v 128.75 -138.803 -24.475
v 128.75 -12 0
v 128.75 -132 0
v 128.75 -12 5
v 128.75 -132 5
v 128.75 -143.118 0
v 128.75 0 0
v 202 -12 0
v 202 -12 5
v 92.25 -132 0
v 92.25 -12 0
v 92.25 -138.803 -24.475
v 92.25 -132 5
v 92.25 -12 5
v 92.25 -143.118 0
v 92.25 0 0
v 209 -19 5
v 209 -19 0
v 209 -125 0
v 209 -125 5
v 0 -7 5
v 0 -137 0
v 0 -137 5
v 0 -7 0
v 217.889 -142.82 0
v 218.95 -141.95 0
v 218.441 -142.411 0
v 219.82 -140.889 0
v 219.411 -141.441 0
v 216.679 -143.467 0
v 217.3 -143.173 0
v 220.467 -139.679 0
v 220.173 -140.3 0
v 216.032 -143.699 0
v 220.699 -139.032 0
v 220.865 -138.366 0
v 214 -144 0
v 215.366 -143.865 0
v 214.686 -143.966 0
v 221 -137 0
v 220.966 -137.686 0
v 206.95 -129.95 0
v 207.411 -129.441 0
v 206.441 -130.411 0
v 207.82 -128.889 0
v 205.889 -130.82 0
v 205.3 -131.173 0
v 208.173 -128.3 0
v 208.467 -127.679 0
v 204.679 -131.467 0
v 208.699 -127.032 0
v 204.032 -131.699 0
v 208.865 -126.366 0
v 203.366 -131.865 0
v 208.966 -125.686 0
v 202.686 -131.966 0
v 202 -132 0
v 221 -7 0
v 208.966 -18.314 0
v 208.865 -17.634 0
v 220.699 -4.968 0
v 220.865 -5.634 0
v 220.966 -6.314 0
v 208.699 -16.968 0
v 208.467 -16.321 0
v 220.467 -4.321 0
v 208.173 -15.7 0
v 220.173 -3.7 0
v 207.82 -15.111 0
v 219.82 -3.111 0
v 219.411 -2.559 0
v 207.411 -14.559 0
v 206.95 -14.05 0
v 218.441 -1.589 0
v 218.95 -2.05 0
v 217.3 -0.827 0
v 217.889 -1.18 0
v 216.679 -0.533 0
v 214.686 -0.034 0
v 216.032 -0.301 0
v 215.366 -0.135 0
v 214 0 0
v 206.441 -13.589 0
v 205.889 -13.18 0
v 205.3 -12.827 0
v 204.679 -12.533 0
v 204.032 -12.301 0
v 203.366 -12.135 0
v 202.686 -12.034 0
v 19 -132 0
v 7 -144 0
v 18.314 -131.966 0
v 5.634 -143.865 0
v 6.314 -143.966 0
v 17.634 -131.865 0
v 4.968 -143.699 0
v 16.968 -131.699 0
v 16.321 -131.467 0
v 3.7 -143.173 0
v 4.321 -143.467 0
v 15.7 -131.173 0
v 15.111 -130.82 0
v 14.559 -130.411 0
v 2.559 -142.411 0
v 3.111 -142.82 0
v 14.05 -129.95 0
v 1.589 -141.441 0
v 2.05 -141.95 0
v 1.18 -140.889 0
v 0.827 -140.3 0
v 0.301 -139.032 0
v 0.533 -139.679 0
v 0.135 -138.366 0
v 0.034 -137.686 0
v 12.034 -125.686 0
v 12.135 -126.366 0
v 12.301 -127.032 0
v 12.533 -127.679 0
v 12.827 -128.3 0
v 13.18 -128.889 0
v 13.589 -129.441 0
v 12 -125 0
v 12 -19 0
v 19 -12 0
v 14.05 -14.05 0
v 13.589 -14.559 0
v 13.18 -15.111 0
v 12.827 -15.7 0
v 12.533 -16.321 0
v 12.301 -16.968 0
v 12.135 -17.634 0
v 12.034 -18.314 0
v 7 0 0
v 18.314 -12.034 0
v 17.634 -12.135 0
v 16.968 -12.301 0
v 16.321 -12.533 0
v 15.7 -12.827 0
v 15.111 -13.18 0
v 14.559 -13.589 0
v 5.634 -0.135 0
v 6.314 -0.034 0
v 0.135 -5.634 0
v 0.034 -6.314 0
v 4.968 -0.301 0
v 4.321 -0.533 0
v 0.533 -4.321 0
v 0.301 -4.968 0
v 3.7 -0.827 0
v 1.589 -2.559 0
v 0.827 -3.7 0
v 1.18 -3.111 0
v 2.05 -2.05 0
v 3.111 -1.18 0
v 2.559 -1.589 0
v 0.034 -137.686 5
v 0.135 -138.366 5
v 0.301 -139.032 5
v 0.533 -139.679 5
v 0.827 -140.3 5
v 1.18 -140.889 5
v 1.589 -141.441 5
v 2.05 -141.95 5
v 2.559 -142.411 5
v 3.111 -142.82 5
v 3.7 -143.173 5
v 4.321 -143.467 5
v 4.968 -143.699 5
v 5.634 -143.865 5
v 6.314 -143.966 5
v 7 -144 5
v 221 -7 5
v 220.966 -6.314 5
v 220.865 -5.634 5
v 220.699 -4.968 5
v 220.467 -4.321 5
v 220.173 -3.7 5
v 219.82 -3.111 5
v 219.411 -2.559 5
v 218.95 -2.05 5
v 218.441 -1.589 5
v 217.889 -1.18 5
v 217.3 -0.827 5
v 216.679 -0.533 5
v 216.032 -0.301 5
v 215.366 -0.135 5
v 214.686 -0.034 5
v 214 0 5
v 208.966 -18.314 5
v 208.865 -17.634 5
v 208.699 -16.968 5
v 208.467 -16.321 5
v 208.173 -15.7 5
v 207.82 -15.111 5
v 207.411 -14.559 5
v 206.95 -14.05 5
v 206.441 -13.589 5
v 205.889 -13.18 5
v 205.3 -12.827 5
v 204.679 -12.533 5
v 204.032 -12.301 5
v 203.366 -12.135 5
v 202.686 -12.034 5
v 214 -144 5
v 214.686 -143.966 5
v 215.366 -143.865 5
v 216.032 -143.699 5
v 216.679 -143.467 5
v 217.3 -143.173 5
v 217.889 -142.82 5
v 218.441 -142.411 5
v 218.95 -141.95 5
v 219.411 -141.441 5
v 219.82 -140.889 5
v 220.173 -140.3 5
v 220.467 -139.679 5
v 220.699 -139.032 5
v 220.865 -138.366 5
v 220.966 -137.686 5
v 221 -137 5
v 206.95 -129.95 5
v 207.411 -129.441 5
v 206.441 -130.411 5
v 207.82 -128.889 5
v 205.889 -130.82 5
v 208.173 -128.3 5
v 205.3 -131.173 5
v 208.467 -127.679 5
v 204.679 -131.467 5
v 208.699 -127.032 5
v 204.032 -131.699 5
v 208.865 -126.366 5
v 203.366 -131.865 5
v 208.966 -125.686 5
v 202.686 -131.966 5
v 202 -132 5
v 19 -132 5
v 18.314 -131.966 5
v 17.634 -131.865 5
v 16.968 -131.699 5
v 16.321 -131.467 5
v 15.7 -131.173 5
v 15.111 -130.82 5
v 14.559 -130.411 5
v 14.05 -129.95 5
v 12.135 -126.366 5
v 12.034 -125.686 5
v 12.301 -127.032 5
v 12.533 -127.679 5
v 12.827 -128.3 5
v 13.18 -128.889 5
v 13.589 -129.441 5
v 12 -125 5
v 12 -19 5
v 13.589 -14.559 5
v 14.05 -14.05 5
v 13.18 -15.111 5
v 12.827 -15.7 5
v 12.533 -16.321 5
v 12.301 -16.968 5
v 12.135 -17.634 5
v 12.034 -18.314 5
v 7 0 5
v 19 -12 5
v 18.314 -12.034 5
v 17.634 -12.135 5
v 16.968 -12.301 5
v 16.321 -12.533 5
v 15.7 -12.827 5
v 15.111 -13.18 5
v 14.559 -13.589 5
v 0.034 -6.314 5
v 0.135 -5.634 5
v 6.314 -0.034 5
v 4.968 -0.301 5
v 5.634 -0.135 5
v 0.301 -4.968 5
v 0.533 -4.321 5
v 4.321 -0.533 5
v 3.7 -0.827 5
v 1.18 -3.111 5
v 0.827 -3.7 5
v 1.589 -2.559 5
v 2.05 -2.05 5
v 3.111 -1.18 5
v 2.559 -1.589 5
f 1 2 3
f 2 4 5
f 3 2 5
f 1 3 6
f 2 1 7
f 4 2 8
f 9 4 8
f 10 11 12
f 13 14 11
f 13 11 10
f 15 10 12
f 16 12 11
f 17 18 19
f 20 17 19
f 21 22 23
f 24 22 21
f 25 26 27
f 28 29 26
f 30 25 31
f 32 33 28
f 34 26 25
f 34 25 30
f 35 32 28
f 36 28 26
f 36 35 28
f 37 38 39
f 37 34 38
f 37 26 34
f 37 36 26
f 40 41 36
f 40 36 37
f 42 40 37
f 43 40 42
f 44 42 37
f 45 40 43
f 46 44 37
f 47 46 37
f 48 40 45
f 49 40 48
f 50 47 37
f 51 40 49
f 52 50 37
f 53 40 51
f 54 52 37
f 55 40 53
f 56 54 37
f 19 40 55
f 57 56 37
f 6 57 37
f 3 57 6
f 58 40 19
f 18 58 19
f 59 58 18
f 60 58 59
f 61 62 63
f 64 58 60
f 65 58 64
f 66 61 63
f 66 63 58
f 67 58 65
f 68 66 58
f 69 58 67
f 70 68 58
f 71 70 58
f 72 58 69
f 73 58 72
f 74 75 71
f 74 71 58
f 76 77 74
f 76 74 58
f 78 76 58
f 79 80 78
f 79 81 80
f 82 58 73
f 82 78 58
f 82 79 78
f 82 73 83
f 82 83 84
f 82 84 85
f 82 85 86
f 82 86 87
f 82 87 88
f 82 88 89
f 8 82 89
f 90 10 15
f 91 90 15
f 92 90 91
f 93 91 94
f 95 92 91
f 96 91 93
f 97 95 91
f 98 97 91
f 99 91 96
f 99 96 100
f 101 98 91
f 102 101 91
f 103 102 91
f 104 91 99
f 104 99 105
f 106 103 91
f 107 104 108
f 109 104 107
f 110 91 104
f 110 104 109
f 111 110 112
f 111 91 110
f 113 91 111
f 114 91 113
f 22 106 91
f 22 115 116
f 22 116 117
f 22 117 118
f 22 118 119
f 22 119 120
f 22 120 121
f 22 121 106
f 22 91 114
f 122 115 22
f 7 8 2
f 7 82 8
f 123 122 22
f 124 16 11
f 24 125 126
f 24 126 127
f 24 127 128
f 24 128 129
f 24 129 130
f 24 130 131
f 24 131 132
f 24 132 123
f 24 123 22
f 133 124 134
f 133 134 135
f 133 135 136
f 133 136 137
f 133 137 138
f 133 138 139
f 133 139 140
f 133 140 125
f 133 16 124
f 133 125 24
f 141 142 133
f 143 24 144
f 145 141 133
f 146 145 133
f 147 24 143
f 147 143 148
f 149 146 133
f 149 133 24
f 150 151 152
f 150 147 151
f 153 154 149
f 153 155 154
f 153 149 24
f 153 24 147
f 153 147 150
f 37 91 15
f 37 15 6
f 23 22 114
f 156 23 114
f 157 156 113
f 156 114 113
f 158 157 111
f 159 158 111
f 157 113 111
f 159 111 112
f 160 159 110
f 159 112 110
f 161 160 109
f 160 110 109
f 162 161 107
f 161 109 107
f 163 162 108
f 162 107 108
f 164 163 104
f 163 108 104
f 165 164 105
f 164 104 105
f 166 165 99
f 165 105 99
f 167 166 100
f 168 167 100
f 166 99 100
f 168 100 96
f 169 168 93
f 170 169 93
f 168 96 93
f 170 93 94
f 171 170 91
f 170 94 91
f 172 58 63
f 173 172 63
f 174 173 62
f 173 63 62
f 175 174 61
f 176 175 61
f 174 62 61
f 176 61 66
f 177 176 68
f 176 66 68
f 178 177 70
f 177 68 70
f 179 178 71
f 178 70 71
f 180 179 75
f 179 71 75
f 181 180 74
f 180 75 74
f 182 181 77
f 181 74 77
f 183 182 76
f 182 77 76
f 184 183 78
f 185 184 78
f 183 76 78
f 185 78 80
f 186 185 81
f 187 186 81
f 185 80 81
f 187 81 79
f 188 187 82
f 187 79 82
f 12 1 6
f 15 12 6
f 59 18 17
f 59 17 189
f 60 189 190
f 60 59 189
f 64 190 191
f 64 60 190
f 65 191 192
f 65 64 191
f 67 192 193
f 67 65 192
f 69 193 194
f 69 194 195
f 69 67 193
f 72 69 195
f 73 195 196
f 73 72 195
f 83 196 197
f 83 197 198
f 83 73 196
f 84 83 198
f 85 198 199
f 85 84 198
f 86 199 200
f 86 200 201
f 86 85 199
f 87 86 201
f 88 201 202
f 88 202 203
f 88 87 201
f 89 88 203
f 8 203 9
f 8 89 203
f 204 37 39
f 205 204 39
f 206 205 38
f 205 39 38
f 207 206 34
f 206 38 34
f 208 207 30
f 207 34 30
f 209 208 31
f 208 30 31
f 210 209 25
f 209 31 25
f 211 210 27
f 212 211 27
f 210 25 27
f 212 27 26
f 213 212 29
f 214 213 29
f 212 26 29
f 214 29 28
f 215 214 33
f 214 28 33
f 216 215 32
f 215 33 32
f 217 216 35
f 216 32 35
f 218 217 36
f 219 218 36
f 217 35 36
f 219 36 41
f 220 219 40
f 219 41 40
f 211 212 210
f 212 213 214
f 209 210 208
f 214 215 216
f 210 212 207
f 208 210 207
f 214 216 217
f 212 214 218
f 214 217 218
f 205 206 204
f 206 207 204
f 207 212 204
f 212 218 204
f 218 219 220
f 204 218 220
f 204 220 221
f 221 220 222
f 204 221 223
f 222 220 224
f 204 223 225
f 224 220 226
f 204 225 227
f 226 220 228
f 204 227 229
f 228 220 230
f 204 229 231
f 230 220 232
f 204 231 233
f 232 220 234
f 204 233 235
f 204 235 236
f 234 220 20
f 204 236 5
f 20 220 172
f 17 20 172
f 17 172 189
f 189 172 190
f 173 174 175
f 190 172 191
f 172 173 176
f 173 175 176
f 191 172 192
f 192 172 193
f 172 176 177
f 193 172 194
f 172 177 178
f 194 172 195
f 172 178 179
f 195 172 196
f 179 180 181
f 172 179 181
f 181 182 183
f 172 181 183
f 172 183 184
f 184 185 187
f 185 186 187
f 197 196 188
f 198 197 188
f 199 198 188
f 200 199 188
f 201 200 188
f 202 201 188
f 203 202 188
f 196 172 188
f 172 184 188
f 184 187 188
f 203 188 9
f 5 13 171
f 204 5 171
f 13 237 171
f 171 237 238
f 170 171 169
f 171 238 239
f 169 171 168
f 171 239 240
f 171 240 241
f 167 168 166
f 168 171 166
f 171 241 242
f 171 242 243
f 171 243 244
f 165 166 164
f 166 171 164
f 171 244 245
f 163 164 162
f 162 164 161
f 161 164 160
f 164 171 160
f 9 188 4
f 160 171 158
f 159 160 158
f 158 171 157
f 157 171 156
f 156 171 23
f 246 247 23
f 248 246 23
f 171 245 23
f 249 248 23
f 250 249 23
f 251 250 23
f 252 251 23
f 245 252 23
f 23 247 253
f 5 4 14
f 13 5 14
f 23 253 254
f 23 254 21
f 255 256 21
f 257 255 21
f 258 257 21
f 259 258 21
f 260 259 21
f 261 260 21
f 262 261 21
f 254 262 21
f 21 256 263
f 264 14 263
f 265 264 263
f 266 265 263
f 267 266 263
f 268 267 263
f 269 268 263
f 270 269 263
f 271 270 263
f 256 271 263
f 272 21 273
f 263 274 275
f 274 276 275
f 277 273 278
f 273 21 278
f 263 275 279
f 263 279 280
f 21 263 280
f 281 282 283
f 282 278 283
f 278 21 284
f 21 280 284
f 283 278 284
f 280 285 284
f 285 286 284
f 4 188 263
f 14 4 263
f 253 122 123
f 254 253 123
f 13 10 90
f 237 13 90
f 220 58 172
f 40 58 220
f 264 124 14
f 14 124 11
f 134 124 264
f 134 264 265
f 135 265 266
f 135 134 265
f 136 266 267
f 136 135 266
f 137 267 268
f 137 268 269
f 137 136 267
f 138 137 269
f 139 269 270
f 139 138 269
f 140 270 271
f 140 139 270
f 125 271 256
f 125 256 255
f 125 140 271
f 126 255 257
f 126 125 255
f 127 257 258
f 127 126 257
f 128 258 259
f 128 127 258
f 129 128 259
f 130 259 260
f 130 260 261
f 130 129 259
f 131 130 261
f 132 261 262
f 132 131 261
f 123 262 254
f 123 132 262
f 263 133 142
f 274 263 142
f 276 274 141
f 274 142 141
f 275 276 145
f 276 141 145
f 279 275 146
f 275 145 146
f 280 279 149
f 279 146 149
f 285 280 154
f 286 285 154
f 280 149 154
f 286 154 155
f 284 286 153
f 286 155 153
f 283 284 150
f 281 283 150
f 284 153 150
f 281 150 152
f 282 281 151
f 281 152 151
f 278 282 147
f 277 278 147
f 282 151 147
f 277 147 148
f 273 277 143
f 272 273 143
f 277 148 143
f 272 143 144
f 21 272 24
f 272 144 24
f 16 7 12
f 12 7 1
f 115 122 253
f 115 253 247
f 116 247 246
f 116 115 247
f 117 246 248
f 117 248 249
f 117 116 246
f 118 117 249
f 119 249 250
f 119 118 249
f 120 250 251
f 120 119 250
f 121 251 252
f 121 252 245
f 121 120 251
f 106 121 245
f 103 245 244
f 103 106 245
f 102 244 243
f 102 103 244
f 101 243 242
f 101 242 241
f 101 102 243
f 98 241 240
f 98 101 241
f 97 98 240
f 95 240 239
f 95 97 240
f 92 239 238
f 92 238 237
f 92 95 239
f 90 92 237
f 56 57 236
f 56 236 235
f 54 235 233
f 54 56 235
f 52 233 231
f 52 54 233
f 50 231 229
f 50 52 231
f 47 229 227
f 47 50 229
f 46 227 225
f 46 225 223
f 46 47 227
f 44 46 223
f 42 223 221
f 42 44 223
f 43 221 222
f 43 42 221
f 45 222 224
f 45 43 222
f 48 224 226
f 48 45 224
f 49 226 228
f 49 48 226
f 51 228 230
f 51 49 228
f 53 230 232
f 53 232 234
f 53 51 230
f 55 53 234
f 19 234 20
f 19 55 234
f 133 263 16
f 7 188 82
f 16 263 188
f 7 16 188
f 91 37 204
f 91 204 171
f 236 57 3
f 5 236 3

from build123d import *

# Parameters (mm, degrees)
PAD_DEPTH    = 5
PAD001_DEPTH = 18.25


with BuildPart() as part:
    # Sketch → Pad (new body)
    with BuildSketch(Plane.XY):
        with BuildLine():
            Line((7, 0), (214, 0))
            ThreePointArc((221, -7), (218.949747, -2.050253), (214, 0))
            Line((221, -7), (221, -137))
            ThreePointArc((214, -144), (218.949747, -141.949747), (221, -137))
            Line((214, -144), (7, -144))
            ThreePointArc((0, -137), (2.050253, -141.949747), (7, -144))
            Line((0, -137), (0, -7))
            ThreePointArc((7, 0), (2.050253, -2.050253), (0, -7))
        make_face()
        with BuildLine():
            Line((19, -12), (202, -12))
            ThreePointArc((209, -19), (206.949747, -14.050253), (202, -12))
            Line((209, -19), (209, -125))
            ThreePointArc((202, -132), (206.949747, -129.949747), (209, -125))
            Line((202, -132), (19, -132))
            ThreePointArc((12, -125), (14.050253, -129.949747), (19, -132))
            Line((12, -125), (12, -19))
            ThreePointArc((19, -12), (14.050253, -14.050253), (12, -19))
        make_face(mode=Mode.SUBTRACT)
    extrude(amount=PAD_DEPTH)

    # Sketch001 (on DatumPlane) → Pad001 (join, symmetric)
    with BuildSketch(Plane.YZ.offset(110.5)):
        Polygon((0, 0), (-138.802818, -24.474682), (-144, 5), (0, 5), align=None)
    extrude(amount=PAD001_DEPTH, both=True)


solid = part.part
